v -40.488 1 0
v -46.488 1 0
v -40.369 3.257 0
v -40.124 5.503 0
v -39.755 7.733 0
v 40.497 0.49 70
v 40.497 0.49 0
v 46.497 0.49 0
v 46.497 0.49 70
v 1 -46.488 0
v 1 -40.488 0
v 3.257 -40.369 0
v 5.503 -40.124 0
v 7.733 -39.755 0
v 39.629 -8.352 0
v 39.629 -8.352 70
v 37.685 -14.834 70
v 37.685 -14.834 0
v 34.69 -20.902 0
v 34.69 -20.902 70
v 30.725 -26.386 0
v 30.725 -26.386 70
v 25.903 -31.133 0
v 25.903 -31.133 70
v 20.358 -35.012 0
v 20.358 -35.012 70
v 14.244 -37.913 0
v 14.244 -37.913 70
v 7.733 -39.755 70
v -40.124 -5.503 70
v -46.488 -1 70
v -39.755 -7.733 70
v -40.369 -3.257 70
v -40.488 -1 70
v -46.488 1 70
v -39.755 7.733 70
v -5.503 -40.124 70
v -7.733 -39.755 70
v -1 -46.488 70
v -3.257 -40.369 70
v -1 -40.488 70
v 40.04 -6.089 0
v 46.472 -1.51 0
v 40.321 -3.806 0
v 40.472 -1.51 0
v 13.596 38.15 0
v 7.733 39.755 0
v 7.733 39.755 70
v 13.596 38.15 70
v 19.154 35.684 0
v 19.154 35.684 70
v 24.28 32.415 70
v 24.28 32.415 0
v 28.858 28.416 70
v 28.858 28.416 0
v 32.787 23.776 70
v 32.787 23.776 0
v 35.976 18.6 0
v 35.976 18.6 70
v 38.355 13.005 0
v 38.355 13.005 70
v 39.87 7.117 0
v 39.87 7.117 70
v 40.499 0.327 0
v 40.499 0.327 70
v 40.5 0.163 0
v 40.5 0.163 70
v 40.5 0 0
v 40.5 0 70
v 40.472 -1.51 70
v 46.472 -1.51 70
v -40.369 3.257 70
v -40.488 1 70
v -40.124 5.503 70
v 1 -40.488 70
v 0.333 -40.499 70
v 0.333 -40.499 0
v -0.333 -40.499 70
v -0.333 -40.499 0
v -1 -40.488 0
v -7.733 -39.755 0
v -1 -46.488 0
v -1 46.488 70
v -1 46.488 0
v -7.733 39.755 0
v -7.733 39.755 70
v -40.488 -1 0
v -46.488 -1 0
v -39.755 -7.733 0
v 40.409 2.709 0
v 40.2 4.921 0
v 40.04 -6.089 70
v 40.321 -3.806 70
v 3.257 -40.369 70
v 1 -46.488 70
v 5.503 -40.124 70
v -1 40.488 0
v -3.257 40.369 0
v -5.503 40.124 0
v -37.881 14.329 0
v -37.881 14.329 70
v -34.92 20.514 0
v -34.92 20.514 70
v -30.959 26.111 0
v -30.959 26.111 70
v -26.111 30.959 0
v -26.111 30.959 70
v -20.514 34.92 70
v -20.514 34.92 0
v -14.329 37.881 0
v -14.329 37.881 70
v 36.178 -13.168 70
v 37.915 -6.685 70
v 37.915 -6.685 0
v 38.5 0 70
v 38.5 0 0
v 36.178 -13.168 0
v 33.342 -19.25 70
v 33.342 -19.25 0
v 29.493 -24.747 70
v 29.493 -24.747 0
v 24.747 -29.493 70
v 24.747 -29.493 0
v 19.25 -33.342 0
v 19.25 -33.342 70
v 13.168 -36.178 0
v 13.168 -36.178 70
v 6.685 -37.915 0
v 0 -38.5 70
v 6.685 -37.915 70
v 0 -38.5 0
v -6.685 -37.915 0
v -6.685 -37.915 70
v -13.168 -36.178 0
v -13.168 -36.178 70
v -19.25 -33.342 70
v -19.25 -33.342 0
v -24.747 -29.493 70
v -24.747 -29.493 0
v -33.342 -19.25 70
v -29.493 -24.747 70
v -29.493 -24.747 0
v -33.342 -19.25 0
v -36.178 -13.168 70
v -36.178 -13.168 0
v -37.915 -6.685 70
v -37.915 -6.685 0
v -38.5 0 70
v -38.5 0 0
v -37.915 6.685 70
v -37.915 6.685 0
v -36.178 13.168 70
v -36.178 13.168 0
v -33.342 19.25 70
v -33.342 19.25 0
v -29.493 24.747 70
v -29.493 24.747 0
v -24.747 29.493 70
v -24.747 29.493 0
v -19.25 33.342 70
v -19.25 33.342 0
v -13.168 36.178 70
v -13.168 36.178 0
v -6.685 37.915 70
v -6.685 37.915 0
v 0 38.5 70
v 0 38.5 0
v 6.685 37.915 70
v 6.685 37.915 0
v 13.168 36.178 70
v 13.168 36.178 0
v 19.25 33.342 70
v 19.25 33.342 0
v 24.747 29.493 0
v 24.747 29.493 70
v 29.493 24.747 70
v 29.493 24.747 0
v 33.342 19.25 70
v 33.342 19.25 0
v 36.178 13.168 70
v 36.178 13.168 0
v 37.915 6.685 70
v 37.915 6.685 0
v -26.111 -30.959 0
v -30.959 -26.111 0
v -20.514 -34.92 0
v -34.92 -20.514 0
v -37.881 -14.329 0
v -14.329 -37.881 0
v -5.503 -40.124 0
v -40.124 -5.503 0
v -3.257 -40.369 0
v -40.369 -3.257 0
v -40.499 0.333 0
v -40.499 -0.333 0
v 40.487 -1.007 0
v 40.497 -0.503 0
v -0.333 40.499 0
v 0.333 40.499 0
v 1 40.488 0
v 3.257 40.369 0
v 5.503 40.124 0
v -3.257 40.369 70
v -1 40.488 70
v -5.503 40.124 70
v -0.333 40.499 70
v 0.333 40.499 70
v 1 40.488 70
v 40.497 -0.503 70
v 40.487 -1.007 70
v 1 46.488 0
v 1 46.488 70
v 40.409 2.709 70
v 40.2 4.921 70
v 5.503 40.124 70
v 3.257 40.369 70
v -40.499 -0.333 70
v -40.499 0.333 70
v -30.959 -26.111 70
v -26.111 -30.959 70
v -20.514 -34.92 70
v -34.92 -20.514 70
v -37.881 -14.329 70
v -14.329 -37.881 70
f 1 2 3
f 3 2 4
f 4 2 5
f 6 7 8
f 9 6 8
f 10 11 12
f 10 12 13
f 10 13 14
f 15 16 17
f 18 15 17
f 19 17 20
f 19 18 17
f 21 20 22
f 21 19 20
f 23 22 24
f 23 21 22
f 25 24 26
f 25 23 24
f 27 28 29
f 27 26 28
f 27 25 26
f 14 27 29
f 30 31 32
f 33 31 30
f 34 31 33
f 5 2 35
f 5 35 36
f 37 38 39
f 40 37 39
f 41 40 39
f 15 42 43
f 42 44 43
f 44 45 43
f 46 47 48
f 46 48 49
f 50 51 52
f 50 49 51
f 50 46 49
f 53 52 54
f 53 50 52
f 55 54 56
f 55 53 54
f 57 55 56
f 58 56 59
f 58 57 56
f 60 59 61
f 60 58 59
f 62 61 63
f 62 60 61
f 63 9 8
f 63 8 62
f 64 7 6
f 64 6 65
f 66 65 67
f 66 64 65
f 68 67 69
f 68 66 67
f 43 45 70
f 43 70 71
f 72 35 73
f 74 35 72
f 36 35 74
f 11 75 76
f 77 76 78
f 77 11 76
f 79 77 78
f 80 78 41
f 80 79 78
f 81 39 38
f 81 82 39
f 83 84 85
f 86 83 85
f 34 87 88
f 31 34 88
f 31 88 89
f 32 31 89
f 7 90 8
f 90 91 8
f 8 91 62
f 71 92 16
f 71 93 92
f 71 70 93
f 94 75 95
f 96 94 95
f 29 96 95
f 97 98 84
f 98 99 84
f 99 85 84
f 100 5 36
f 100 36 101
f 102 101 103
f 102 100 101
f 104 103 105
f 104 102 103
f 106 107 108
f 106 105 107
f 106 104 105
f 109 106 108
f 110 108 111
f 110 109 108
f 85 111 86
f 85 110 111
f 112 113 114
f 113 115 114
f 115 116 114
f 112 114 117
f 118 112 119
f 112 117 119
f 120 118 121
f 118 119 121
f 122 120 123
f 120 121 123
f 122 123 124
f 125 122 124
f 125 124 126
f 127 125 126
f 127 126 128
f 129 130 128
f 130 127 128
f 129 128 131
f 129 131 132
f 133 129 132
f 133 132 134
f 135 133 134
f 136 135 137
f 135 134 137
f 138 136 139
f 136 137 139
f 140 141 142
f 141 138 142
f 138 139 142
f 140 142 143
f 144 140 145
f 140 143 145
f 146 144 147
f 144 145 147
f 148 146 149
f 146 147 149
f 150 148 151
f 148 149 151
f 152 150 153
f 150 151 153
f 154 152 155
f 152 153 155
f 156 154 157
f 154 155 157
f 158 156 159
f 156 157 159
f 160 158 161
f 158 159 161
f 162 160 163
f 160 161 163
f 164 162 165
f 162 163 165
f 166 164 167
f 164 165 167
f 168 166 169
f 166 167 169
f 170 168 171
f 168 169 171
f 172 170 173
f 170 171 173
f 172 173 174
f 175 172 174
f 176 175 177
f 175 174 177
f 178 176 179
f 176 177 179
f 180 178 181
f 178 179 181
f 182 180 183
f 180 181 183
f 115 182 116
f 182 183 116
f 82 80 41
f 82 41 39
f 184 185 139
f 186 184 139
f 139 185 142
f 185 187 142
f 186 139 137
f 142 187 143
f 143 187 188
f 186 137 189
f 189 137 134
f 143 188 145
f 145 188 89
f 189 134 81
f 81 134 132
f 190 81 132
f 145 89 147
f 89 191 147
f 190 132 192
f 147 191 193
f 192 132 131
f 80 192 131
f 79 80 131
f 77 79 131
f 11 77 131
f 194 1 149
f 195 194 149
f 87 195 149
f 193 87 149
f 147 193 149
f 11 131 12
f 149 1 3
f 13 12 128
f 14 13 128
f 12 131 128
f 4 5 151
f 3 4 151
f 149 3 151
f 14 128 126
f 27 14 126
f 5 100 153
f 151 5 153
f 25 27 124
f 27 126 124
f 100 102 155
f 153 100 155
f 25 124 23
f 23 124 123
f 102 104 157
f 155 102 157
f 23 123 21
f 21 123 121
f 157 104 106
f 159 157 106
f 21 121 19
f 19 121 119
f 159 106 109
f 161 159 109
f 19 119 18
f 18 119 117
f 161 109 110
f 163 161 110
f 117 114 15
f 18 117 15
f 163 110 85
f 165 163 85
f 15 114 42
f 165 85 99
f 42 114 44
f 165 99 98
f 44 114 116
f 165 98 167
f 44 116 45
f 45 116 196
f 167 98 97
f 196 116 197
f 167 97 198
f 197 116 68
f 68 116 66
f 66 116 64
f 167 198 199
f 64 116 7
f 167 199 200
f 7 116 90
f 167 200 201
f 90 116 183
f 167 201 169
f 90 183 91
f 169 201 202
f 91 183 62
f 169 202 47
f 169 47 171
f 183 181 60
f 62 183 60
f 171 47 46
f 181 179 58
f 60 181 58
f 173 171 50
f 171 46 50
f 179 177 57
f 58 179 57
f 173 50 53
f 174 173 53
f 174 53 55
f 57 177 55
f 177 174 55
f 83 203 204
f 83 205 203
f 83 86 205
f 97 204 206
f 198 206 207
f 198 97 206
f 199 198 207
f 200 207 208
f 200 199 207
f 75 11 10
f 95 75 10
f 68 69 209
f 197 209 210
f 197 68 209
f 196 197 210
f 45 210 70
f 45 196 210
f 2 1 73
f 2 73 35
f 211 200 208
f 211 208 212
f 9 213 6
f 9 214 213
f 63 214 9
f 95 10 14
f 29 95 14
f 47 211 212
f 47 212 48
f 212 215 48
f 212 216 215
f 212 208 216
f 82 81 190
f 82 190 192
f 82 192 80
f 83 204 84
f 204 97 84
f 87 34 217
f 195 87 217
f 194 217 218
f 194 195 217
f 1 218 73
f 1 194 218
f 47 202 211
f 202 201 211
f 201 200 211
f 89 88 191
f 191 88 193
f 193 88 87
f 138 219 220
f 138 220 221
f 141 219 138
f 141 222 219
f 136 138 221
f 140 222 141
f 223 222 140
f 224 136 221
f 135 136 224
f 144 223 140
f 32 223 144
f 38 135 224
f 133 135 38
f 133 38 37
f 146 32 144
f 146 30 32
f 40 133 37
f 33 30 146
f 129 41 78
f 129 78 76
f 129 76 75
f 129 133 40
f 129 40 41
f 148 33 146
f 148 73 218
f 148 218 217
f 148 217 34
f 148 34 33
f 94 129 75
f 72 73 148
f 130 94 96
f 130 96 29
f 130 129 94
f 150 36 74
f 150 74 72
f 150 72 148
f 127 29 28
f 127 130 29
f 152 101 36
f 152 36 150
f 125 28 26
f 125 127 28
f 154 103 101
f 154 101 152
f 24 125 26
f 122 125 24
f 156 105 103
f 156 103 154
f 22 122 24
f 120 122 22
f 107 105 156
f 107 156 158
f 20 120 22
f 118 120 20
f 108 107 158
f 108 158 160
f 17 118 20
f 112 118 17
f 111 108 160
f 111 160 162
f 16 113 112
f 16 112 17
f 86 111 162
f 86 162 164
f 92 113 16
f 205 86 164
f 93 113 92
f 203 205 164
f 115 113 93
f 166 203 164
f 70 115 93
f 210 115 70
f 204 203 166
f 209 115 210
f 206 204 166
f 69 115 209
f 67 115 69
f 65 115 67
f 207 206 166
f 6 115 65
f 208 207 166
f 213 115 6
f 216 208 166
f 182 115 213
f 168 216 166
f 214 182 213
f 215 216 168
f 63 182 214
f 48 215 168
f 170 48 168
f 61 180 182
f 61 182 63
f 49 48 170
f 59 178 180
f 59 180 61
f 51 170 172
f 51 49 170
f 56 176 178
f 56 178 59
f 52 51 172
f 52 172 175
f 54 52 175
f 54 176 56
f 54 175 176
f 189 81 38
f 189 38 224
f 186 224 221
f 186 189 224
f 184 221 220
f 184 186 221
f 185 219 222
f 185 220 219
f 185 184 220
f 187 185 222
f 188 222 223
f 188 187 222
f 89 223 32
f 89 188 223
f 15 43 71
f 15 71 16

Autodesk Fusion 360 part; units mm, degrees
sketch "Sketch1" plane through (0, 0, 0) normal (0, 0, 1) x (1, 0, 0)
  circle A0 centre (0, 0) radius 38.5
  circle A1 centre (0, 0) radius 40.5
  line L0 (40.497, 0.49) -> (46.497, 0.49)
  line L1 (46.497, 0.49) -> (39.8697, 7.1173)
  line L2 (46.497, 0.49) -> (37.1246, 0.49) construction
  line L3 (46.497, 0.49) -> (46.497, -1.51) construction
  line L4 (37.1246, 0.49) -> (37.1246, -1.51) construction
  line L5 (37.1246, -1.51) -> (40.4718, -1.51) construction
  line L6 (40.4718, -1.51) -> (46.4718, -1.51)
  line L7 (46.4718, -1.51) -> (39.6294, -8.3525)
  line L8 (-1, 37) -> (1, 37) construction
  line L9 (1, 37) -> (1, 40.4877) construction
  line L10 (-1, 37) -> (-1, 40.4877) construction
  line L11 (-1, 40.4877) -> (-1, 46.4877)
  line L12 (-1, 46.4877) -> (-7.7327, 39.7549)
  line L13 (1, 40.4877) -> (1, 46.4877)
  line L14 (1, 46.4877) -> (7.7327, 39.7549)
  line L15 (-35, 1) -> (-35, -1) construction
  line L16 (-35, -1) -> (-40.4877, -1) construction
  line L17 (-35, 1) -> (-40.4877, 1) construction
  line L18 (-40.4877, -1) -> (-46.4877, -1)
  line L19 (-46.4877, -1) -> (-39.7549, -7.7327)
  line L20 (-40.4877, 1) -> (-46.4877, 1)
  line L21 (-46.4877, 1) -> (-39.7549, 7.7327)
  line L22 (-1, -37.5) -> (1, -37.5) construction
  line L23 (1, -37.5) -> (1, -40.4877) construction
  line L24 (-1, -37.5) -> (-1, -40.4877) construction
  line L25 (-1, -40.4877) -> (-1, -46.4877)
  line L26 (-1, -46.4877) -> (-7.7327, -39.7549)
  line L27 (1, -40.4877) -> (1, -46.4877)
  line L28 (1, -46.4877) -> (7.7327, -39.7549)
  dimension "d5" = 77
  dimension "d6" = 81
  dimension "d7" = 81
  dimension "d8" = 6
  dimension "d9" = 45
  dimension "d10" = 2
  dimension "d11" = 2
  dimension "d12" = 6
  dimension "d13" = 45
  dimension "d14" = 2
  dimension "d15" = 6
  dimension "d16" = 45
  dimension "d17" = 6
  dimension "d18" = 45
  dimension "d19" = 2
  dimension "d20" = 6
  dimension "d21" = 45
  dimension "d22" = 6
  dimension "d23" = 45
  dimension "d24" = 2
  dimension "d25" = 6
  dimension "d26" = 45
  dimension "d27" = 6
  dimension "d28" = 45
extrude "Extrude1" add sketch "Sketch1" along normal blind 70
equation "ytredim = 77 mm"
equation "lengdeholder = 6 mm"
equation "breddeholder = 2 mm"
equation "gradholder = 45 deg"
equation "d5 = ytredim"
equation "d6 = ytredim + 4 mm"
equation "d8 = lengdeholder"
equation "d9 = gradholder"
equation "d10 = breddeholder"
equation "d11 = breddeholder"
equation "d12 = lengdeholder"
equation "d13 = gradholder"
equation "d14 = breddeholder"
equation "d15 = lengdeholder"
equation "d16 = gradholder"
equation "d17 = lengdeholder"
equation "d18 = gradholder"
equation "d19 = breddeholder"
equation "d20 = lengdeholder"
equation "d21 = gradholder"
equation "d22 = lengdeholder"
equation "d23 = gradholder"
equation "d24 = breddeholder"
equation "d25 = lengdeholder"
equation "d26 = gradholder"
equation "d27 = lengdeholder"
equation "d28 = gradholder"
